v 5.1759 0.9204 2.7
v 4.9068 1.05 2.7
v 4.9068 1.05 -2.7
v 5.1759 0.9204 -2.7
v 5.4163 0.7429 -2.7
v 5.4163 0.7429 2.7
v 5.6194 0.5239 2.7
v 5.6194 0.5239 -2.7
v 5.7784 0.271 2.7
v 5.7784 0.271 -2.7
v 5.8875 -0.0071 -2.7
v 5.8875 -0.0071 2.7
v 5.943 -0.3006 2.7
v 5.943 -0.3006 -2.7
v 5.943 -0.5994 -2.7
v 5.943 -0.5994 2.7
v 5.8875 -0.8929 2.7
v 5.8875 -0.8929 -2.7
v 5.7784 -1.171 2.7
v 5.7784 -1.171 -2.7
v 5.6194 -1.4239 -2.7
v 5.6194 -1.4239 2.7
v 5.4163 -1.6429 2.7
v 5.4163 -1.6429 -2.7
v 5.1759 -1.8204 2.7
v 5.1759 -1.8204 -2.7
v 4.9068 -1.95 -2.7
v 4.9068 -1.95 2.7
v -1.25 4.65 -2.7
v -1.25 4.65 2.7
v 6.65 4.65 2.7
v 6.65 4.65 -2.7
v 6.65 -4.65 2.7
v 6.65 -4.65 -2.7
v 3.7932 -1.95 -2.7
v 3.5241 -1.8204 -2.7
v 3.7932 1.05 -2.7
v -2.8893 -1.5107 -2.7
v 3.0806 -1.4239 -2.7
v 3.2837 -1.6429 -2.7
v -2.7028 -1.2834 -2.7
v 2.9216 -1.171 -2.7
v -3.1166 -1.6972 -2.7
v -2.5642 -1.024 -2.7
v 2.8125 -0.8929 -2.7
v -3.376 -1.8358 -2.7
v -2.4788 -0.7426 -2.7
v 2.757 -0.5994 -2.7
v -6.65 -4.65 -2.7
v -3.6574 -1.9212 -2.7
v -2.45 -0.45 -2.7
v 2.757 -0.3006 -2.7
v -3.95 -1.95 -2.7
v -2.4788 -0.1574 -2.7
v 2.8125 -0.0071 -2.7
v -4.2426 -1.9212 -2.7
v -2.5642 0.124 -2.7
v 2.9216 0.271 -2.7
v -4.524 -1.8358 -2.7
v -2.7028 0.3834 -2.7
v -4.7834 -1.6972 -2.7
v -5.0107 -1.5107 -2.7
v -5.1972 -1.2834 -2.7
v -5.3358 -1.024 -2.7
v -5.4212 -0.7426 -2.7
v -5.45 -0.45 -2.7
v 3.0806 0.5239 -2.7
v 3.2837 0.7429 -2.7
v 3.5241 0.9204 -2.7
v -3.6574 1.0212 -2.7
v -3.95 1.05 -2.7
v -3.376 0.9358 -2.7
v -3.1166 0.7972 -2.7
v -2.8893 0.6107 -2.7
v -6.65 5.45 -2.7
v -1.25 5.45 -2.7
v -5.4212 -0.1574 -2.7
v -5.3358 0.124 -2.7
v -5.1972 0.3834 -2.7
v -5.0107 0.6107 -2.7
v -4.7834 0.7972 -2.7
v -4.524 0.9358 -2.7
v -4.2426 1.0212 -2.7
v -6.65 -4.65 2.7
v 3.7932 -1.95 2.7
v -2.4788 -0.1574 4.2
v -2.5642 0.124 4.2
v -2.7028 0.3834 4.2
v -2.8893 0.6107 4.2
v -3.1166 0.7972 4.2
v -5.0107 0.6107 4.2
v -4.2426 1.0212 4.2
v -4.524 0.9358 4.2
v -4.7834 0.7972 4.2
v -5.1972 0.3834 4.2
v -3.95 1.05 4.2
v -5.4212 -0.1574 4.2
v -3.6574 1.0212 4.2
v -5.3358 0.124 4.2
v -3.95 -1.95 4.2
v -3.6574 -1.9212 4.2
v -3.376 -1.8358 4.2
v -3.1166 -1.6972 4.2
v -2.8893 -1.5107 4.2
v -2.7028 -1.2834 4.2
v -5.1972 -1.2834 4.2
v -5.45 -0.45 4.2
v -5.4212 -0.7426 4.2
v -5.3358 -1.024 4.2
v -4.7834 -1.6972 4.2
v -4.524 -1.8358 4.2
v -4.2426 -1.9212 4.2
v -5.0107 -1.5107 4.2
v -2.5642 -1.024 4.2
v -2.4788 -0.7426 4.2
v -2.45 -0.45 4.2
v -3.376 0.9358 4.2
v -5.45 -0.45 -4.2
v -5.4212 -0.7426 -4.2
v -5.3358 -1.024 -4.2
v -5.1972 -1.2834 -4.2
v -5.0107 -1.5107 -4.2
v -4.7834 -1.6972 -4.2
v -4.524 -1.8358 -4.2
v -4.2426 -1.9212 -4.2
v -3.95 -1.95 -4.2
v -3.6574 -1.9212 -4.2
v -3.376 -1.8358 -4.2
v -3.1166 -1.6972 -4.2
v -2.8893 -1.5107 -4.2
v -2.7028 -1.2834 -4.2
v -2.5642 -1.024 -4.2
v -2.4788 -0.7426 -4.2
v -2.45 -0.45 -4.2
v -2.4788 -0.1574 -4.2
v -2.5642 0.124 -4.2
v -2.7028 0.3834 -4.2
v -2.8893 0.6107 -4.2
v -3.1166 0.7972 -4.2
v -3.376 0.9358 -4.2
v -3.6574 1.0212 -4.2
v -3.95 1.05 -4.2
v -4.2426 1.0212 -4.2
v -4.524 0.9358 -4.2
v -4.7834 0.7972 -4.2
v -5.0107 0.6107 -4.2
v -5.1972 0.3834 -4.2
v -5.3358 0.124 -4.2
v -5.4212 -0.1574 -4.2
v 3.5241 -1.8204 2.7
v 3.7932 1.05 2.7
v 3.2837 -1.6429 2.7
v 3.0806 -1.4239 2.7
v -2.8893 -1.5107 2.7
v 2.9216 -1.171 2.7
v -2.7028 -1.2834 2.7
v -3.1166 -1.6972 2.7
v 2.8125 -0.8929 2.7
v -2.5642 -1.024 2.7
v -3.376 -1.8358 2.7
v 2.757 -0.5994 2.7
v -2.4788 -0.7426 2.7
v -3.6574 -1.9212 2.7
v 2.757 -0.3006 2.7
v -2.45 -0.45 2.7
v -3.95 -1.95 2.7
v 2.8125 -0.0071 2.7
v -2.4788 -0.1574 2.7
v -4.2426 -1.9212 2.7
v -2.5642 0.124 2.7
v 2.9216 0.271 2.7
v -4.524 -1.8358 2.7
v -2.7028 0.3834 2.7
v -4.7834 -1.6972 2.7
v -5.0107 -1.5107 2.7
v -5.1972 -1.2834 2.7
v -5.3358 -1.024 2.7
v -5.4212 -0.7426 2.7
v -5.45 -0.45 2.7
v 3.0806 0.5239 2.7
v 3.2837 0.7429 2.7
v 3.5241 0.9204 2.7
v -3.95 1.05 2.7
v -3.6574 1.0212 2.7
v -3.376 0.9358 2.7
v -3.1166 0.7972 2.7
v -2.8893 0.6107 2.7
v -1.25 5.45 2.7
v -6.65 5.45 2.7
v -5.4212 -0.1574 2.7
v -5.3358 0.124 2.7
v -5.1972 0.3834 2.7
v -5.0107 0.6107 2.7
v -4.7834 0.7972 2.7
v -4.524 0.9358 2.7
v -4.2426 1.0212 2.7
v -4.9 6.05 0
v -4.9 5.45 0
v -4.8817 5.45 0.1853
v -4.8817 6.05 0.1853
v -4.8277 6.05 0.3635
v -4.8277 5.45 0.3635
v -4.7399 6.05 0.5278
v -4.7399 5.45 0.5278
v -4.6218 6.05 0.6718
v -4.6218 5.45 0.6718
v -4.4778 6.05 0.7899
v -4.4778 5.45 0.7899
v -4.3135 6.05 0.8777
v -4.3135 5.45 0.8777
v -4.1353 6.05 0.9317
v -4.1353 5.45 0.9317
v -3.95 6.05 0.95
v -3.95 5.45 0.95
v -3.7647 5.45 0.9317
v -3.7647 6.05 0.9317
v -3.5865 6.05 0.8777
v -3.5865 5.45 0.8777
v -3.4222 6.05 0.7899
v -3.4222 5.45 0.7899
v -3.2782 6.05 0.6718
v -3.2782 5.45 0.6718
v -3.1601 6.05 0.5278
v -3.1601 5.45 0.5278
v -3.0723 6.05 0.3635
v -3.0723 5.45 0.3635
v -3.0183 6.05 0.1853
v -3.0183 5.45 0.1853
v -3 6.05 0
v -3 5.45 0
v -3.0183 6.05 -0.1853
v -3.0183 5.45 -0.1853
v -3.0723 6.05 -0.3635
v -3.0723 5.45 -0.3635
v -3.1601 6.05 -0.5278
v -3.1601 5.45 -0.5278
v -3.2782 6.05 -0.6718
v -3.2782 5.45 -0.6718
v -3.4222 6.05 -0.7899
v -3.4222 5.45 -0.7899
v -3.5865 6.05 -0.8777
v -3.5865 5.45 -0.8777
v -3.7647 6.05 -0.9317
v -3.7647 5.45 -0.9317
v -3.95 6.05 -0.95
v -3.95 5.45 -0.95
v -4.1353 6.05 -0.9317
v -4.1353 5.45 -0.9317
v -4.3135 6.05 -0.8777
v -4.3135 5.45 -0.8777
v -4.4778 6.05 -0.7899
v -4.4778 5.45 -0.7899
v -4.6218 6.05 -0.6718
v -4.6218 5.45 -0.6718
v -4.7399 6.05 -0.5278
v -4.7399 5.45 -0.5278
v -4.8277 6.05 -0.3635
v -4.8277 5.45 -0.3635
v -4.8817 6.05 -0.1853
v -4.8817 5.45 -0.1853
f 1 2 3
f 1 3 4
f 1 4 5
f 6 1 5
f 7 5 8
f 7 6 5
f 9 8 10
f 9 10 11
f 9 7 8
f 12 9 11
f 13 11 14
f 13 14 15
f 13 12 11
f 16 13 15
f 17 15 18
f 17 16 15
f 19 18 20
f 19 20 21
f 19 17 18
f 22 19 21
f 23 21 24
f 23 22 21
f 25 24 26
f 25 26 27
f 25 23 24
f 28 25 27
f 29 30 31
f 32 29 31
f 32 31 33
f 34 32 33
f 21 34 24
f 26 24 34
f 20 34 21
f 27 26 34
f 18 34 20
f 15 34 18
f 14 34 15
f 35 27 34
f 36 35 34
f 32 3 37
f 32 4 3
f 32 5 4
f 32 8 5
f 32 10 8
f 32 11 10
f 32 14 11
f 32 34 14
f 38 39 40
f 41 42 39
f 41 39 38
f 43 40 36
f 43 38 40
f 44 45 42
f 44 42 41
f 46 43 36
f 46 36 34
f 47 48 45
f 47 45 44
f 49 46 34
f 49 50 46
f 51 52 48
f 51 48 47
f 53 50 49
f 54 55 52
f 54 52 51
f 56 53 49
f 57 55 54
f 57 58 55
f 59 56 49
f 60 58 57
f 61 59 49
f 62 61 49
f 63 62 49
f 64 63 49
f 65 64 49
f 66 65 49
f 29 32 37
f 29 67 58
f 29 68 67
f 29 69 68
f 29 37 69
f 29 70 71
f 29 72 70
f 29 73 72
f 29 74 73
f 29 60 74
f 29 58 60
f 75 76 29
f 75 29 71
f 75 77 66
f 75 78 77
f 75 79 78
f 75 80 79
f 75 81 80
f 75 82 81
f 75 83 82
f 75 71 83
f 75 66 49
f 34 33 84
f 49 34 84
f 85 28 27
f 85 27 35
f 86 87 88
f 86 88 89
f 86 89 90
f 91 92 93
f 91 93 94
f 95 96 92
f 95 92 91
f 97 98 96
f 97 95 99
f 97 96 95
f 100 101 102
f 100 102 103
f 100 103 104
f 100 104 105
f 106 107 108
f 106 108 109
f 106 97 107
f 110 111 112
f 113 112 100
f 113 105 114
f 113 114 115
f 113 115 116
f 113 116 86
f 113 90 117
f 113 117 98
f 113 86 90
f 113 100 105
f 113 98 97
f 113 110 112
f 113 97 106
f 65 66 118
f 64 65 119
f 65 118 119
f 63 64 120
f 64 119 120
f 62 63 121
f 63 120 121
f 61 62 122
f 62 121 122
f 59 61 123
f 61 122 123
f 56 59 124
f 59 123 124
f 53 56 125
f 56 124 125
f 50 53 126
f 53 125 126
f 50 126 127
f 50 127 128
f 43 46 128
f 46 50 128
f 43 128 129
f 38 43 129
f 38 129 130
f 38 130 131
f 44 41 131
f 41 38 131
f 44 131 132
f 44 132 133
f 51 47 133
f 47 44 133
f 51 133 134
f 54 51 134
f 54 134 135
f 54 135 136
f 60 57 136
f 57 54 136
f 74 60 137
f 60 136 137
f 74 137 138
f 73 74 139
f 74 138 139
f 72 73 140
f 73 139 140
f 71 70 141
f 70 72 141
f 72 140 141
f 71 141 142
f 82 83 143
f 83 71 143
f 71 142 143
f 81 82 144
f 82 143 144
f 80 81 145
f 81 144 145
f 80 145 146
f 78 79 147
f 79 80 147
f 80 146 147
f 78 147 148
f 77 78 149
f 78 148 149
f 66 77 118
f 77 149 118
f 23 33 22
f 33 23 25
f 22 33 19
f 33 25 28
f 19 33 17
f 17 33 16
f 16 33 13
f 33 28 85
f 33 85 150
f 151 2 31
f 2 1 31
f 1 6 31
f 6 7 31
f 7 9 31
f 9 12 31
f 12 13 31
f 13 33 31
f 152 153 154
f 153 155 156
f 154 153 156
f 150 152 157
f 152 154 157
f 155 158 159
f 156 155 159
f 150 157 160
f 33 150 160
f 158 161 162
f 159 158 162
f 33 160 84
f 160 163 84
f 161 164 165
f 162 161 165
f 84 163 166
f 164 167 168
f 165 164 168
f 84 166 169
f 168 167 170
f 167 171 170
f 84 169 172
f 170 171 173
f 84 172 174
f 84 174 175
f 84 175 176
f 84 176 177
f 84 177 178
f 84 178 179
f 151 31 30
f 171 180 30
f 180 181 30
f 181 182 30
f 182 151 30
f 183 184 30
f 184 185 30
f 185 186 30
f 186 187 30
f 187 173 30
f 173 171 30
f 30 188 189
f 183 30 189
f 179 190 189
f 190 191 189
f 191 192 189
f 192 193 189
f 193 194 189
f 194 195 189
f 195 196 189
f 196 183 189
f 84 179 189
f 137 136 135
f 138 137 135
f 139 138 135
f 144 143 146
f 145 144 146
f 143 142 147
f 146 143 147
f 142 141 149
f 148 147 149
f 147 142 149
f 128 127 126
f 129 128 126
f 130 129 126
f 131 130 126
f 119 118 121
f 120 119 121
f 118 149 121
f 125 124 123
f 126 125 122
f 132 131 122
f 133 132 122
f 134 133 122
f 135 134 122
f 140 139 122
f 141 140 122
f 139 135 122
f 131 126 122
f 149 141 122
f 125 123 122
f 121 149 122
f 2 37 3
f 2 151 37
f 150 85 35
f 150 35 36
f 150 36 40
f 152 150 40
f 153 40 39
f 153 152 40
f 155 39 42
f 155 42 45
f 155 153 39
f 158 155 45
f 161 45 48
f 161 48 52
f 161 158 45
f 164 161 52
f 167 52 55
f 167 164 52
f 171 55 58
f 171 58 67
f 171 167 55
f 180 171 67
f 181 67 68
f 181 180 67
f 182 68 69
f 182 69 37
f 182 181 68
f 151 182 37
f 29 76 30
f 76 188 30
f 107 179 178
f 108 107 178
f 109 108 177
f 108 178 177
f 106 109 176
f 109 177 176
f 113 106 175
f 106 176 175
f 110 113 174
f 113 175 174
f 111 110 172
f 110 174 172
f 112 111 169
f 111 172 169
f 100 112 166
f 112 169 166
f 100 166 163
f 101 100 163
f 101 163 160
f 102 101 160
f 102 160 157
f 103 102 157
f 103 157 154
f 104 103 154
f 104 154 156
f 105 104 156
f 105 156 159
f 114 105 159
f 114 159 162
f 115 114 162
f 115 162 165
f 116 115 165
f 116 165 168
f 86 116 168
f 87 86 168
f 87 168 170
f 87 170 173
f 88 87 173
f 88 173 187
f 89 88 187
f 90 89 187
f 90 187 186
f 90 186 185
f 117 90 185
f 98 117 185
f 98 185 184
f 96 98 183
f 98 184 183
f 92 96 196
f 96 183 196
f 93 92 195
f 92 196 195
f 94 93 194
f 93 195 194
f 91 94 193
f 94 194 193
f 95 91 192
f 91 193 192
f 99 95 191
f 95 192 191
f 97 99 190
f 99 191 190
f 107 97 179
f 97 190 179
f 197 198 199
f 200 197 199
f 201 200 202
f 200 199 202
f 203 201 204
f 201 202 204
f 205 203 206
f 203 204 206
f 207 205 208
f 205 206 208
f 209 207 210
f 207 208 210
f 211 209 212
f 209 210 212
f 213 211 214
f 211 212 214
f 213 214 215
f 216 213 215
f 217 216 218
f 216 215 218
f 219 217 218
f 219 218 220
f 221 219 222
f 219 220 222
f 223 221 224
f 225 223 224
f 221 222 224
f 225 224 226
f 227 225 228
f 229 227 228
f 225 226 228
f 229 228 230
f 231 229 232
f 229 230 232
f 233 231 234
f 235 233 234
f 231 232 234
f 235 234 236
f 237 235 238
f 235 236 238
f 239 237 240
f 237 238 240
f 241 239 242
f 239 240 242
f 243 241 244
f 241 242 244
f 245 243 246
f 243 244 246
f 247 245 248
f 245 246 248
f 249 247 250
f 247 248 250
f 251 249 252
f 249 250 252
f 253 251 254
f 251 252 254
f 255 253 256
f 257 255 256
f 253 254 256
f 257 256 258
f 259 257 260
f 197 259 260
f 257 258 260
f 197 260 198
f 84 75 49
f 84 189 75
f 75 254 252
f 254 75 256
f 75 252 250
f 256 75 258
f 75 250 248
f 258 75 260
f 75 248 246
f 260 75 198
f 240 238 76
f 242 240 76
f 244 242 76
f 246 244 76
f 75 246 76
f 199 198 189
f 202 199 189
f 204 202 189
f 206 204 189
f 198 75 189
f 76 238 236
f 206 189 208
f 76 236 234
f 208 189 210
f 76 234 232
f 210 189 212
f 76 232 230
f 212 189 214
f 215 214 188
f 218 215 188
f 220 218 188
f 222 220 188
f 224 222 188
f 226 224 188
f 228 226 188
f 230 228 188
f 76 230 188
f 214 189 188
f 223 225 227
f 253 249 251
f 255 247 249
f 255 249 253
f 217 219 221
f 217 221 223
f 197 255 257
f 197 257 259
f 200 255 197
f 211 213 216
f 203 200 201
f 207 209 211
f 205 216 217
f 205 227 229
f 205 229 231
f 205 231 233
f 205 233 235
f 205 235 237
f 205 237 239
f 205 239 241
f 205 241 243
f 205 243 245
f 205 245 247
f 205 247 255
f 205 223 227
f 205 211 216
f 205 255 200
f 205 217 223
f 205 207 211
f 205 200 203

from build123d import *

# Parameters (mm, degrees)
BOSS_EXTRUDE1_DEPTH      = 2.7
BOSS_EXTRUDE2_DEPTH      = 4.2
BOSS_EXTRUDE2_DEPTH_BACK = 4.2
SKETCH3_R                = 1.5
SKETCH4_R                = 0.95
BOSS_EXTRUDE3_DEPTH      = 0.6


with BuildPart() as part:
    # Sketch1 → Boss-Extrude1 (new, symmetric)
    with BuildSketch(Plane.XY):
        Polygon((6.65, -4.65), (-6.65, -4.65), (-6.65, 4.65), (-6.65, 5.45), (-1.25, 5.45), (-1.25, 4.65), (6.65, 4.65), align=None)
        with BuildLine():
            Line((3.793223564, 1.05), (4.906776436, 1.05))
            ThreePointArc((4.906776436, 1.05), (5.95, -0.45), (4.906776436, -1.95))
            Line((4.906776436, -1.95), (3.793223564, -1.95))
            ThreePointArc((3.793223564, -1.95), (2.75, -0.45), (3.793223564, 1.05))
        make_face(mode=Mode.SUBTRACT)
    extrude(amount=BOSS_EXTRUDE1_DEPTH, both=True)

    # Sketch3 → Boss-Extrude2 (add, two sides: drawn at the far end of the back side and taken through both)
    with BuildSketch(Plane.XY.offset(-BOSS_EXTRUDE2_DEPTH_BACK)):
        with Locations(Location((-3.95, -0.45, 0), (0, 0, 180))):
            Circle(SKETCH3_R)
    extrude(amount=BOSS_EXTRUDE2_DEPTH + BOSS_EXTRUDE2_DEPTH_BACK)

    # Sketch4 → Boss-Extrude3 (add)
    with BuildSketch(Plane(origin=(0, 5.45, 0), x_dir=(1, 0, 0), z_dir=(0, 1, 0))):
        with Locations(Location((-3.95, 0, 0), (0, 0, 180))):
            Circle(SKETCH4_R)
    extrude(amount=BOSS_EXTRUDE3_DEPTH)


solid = part.part
